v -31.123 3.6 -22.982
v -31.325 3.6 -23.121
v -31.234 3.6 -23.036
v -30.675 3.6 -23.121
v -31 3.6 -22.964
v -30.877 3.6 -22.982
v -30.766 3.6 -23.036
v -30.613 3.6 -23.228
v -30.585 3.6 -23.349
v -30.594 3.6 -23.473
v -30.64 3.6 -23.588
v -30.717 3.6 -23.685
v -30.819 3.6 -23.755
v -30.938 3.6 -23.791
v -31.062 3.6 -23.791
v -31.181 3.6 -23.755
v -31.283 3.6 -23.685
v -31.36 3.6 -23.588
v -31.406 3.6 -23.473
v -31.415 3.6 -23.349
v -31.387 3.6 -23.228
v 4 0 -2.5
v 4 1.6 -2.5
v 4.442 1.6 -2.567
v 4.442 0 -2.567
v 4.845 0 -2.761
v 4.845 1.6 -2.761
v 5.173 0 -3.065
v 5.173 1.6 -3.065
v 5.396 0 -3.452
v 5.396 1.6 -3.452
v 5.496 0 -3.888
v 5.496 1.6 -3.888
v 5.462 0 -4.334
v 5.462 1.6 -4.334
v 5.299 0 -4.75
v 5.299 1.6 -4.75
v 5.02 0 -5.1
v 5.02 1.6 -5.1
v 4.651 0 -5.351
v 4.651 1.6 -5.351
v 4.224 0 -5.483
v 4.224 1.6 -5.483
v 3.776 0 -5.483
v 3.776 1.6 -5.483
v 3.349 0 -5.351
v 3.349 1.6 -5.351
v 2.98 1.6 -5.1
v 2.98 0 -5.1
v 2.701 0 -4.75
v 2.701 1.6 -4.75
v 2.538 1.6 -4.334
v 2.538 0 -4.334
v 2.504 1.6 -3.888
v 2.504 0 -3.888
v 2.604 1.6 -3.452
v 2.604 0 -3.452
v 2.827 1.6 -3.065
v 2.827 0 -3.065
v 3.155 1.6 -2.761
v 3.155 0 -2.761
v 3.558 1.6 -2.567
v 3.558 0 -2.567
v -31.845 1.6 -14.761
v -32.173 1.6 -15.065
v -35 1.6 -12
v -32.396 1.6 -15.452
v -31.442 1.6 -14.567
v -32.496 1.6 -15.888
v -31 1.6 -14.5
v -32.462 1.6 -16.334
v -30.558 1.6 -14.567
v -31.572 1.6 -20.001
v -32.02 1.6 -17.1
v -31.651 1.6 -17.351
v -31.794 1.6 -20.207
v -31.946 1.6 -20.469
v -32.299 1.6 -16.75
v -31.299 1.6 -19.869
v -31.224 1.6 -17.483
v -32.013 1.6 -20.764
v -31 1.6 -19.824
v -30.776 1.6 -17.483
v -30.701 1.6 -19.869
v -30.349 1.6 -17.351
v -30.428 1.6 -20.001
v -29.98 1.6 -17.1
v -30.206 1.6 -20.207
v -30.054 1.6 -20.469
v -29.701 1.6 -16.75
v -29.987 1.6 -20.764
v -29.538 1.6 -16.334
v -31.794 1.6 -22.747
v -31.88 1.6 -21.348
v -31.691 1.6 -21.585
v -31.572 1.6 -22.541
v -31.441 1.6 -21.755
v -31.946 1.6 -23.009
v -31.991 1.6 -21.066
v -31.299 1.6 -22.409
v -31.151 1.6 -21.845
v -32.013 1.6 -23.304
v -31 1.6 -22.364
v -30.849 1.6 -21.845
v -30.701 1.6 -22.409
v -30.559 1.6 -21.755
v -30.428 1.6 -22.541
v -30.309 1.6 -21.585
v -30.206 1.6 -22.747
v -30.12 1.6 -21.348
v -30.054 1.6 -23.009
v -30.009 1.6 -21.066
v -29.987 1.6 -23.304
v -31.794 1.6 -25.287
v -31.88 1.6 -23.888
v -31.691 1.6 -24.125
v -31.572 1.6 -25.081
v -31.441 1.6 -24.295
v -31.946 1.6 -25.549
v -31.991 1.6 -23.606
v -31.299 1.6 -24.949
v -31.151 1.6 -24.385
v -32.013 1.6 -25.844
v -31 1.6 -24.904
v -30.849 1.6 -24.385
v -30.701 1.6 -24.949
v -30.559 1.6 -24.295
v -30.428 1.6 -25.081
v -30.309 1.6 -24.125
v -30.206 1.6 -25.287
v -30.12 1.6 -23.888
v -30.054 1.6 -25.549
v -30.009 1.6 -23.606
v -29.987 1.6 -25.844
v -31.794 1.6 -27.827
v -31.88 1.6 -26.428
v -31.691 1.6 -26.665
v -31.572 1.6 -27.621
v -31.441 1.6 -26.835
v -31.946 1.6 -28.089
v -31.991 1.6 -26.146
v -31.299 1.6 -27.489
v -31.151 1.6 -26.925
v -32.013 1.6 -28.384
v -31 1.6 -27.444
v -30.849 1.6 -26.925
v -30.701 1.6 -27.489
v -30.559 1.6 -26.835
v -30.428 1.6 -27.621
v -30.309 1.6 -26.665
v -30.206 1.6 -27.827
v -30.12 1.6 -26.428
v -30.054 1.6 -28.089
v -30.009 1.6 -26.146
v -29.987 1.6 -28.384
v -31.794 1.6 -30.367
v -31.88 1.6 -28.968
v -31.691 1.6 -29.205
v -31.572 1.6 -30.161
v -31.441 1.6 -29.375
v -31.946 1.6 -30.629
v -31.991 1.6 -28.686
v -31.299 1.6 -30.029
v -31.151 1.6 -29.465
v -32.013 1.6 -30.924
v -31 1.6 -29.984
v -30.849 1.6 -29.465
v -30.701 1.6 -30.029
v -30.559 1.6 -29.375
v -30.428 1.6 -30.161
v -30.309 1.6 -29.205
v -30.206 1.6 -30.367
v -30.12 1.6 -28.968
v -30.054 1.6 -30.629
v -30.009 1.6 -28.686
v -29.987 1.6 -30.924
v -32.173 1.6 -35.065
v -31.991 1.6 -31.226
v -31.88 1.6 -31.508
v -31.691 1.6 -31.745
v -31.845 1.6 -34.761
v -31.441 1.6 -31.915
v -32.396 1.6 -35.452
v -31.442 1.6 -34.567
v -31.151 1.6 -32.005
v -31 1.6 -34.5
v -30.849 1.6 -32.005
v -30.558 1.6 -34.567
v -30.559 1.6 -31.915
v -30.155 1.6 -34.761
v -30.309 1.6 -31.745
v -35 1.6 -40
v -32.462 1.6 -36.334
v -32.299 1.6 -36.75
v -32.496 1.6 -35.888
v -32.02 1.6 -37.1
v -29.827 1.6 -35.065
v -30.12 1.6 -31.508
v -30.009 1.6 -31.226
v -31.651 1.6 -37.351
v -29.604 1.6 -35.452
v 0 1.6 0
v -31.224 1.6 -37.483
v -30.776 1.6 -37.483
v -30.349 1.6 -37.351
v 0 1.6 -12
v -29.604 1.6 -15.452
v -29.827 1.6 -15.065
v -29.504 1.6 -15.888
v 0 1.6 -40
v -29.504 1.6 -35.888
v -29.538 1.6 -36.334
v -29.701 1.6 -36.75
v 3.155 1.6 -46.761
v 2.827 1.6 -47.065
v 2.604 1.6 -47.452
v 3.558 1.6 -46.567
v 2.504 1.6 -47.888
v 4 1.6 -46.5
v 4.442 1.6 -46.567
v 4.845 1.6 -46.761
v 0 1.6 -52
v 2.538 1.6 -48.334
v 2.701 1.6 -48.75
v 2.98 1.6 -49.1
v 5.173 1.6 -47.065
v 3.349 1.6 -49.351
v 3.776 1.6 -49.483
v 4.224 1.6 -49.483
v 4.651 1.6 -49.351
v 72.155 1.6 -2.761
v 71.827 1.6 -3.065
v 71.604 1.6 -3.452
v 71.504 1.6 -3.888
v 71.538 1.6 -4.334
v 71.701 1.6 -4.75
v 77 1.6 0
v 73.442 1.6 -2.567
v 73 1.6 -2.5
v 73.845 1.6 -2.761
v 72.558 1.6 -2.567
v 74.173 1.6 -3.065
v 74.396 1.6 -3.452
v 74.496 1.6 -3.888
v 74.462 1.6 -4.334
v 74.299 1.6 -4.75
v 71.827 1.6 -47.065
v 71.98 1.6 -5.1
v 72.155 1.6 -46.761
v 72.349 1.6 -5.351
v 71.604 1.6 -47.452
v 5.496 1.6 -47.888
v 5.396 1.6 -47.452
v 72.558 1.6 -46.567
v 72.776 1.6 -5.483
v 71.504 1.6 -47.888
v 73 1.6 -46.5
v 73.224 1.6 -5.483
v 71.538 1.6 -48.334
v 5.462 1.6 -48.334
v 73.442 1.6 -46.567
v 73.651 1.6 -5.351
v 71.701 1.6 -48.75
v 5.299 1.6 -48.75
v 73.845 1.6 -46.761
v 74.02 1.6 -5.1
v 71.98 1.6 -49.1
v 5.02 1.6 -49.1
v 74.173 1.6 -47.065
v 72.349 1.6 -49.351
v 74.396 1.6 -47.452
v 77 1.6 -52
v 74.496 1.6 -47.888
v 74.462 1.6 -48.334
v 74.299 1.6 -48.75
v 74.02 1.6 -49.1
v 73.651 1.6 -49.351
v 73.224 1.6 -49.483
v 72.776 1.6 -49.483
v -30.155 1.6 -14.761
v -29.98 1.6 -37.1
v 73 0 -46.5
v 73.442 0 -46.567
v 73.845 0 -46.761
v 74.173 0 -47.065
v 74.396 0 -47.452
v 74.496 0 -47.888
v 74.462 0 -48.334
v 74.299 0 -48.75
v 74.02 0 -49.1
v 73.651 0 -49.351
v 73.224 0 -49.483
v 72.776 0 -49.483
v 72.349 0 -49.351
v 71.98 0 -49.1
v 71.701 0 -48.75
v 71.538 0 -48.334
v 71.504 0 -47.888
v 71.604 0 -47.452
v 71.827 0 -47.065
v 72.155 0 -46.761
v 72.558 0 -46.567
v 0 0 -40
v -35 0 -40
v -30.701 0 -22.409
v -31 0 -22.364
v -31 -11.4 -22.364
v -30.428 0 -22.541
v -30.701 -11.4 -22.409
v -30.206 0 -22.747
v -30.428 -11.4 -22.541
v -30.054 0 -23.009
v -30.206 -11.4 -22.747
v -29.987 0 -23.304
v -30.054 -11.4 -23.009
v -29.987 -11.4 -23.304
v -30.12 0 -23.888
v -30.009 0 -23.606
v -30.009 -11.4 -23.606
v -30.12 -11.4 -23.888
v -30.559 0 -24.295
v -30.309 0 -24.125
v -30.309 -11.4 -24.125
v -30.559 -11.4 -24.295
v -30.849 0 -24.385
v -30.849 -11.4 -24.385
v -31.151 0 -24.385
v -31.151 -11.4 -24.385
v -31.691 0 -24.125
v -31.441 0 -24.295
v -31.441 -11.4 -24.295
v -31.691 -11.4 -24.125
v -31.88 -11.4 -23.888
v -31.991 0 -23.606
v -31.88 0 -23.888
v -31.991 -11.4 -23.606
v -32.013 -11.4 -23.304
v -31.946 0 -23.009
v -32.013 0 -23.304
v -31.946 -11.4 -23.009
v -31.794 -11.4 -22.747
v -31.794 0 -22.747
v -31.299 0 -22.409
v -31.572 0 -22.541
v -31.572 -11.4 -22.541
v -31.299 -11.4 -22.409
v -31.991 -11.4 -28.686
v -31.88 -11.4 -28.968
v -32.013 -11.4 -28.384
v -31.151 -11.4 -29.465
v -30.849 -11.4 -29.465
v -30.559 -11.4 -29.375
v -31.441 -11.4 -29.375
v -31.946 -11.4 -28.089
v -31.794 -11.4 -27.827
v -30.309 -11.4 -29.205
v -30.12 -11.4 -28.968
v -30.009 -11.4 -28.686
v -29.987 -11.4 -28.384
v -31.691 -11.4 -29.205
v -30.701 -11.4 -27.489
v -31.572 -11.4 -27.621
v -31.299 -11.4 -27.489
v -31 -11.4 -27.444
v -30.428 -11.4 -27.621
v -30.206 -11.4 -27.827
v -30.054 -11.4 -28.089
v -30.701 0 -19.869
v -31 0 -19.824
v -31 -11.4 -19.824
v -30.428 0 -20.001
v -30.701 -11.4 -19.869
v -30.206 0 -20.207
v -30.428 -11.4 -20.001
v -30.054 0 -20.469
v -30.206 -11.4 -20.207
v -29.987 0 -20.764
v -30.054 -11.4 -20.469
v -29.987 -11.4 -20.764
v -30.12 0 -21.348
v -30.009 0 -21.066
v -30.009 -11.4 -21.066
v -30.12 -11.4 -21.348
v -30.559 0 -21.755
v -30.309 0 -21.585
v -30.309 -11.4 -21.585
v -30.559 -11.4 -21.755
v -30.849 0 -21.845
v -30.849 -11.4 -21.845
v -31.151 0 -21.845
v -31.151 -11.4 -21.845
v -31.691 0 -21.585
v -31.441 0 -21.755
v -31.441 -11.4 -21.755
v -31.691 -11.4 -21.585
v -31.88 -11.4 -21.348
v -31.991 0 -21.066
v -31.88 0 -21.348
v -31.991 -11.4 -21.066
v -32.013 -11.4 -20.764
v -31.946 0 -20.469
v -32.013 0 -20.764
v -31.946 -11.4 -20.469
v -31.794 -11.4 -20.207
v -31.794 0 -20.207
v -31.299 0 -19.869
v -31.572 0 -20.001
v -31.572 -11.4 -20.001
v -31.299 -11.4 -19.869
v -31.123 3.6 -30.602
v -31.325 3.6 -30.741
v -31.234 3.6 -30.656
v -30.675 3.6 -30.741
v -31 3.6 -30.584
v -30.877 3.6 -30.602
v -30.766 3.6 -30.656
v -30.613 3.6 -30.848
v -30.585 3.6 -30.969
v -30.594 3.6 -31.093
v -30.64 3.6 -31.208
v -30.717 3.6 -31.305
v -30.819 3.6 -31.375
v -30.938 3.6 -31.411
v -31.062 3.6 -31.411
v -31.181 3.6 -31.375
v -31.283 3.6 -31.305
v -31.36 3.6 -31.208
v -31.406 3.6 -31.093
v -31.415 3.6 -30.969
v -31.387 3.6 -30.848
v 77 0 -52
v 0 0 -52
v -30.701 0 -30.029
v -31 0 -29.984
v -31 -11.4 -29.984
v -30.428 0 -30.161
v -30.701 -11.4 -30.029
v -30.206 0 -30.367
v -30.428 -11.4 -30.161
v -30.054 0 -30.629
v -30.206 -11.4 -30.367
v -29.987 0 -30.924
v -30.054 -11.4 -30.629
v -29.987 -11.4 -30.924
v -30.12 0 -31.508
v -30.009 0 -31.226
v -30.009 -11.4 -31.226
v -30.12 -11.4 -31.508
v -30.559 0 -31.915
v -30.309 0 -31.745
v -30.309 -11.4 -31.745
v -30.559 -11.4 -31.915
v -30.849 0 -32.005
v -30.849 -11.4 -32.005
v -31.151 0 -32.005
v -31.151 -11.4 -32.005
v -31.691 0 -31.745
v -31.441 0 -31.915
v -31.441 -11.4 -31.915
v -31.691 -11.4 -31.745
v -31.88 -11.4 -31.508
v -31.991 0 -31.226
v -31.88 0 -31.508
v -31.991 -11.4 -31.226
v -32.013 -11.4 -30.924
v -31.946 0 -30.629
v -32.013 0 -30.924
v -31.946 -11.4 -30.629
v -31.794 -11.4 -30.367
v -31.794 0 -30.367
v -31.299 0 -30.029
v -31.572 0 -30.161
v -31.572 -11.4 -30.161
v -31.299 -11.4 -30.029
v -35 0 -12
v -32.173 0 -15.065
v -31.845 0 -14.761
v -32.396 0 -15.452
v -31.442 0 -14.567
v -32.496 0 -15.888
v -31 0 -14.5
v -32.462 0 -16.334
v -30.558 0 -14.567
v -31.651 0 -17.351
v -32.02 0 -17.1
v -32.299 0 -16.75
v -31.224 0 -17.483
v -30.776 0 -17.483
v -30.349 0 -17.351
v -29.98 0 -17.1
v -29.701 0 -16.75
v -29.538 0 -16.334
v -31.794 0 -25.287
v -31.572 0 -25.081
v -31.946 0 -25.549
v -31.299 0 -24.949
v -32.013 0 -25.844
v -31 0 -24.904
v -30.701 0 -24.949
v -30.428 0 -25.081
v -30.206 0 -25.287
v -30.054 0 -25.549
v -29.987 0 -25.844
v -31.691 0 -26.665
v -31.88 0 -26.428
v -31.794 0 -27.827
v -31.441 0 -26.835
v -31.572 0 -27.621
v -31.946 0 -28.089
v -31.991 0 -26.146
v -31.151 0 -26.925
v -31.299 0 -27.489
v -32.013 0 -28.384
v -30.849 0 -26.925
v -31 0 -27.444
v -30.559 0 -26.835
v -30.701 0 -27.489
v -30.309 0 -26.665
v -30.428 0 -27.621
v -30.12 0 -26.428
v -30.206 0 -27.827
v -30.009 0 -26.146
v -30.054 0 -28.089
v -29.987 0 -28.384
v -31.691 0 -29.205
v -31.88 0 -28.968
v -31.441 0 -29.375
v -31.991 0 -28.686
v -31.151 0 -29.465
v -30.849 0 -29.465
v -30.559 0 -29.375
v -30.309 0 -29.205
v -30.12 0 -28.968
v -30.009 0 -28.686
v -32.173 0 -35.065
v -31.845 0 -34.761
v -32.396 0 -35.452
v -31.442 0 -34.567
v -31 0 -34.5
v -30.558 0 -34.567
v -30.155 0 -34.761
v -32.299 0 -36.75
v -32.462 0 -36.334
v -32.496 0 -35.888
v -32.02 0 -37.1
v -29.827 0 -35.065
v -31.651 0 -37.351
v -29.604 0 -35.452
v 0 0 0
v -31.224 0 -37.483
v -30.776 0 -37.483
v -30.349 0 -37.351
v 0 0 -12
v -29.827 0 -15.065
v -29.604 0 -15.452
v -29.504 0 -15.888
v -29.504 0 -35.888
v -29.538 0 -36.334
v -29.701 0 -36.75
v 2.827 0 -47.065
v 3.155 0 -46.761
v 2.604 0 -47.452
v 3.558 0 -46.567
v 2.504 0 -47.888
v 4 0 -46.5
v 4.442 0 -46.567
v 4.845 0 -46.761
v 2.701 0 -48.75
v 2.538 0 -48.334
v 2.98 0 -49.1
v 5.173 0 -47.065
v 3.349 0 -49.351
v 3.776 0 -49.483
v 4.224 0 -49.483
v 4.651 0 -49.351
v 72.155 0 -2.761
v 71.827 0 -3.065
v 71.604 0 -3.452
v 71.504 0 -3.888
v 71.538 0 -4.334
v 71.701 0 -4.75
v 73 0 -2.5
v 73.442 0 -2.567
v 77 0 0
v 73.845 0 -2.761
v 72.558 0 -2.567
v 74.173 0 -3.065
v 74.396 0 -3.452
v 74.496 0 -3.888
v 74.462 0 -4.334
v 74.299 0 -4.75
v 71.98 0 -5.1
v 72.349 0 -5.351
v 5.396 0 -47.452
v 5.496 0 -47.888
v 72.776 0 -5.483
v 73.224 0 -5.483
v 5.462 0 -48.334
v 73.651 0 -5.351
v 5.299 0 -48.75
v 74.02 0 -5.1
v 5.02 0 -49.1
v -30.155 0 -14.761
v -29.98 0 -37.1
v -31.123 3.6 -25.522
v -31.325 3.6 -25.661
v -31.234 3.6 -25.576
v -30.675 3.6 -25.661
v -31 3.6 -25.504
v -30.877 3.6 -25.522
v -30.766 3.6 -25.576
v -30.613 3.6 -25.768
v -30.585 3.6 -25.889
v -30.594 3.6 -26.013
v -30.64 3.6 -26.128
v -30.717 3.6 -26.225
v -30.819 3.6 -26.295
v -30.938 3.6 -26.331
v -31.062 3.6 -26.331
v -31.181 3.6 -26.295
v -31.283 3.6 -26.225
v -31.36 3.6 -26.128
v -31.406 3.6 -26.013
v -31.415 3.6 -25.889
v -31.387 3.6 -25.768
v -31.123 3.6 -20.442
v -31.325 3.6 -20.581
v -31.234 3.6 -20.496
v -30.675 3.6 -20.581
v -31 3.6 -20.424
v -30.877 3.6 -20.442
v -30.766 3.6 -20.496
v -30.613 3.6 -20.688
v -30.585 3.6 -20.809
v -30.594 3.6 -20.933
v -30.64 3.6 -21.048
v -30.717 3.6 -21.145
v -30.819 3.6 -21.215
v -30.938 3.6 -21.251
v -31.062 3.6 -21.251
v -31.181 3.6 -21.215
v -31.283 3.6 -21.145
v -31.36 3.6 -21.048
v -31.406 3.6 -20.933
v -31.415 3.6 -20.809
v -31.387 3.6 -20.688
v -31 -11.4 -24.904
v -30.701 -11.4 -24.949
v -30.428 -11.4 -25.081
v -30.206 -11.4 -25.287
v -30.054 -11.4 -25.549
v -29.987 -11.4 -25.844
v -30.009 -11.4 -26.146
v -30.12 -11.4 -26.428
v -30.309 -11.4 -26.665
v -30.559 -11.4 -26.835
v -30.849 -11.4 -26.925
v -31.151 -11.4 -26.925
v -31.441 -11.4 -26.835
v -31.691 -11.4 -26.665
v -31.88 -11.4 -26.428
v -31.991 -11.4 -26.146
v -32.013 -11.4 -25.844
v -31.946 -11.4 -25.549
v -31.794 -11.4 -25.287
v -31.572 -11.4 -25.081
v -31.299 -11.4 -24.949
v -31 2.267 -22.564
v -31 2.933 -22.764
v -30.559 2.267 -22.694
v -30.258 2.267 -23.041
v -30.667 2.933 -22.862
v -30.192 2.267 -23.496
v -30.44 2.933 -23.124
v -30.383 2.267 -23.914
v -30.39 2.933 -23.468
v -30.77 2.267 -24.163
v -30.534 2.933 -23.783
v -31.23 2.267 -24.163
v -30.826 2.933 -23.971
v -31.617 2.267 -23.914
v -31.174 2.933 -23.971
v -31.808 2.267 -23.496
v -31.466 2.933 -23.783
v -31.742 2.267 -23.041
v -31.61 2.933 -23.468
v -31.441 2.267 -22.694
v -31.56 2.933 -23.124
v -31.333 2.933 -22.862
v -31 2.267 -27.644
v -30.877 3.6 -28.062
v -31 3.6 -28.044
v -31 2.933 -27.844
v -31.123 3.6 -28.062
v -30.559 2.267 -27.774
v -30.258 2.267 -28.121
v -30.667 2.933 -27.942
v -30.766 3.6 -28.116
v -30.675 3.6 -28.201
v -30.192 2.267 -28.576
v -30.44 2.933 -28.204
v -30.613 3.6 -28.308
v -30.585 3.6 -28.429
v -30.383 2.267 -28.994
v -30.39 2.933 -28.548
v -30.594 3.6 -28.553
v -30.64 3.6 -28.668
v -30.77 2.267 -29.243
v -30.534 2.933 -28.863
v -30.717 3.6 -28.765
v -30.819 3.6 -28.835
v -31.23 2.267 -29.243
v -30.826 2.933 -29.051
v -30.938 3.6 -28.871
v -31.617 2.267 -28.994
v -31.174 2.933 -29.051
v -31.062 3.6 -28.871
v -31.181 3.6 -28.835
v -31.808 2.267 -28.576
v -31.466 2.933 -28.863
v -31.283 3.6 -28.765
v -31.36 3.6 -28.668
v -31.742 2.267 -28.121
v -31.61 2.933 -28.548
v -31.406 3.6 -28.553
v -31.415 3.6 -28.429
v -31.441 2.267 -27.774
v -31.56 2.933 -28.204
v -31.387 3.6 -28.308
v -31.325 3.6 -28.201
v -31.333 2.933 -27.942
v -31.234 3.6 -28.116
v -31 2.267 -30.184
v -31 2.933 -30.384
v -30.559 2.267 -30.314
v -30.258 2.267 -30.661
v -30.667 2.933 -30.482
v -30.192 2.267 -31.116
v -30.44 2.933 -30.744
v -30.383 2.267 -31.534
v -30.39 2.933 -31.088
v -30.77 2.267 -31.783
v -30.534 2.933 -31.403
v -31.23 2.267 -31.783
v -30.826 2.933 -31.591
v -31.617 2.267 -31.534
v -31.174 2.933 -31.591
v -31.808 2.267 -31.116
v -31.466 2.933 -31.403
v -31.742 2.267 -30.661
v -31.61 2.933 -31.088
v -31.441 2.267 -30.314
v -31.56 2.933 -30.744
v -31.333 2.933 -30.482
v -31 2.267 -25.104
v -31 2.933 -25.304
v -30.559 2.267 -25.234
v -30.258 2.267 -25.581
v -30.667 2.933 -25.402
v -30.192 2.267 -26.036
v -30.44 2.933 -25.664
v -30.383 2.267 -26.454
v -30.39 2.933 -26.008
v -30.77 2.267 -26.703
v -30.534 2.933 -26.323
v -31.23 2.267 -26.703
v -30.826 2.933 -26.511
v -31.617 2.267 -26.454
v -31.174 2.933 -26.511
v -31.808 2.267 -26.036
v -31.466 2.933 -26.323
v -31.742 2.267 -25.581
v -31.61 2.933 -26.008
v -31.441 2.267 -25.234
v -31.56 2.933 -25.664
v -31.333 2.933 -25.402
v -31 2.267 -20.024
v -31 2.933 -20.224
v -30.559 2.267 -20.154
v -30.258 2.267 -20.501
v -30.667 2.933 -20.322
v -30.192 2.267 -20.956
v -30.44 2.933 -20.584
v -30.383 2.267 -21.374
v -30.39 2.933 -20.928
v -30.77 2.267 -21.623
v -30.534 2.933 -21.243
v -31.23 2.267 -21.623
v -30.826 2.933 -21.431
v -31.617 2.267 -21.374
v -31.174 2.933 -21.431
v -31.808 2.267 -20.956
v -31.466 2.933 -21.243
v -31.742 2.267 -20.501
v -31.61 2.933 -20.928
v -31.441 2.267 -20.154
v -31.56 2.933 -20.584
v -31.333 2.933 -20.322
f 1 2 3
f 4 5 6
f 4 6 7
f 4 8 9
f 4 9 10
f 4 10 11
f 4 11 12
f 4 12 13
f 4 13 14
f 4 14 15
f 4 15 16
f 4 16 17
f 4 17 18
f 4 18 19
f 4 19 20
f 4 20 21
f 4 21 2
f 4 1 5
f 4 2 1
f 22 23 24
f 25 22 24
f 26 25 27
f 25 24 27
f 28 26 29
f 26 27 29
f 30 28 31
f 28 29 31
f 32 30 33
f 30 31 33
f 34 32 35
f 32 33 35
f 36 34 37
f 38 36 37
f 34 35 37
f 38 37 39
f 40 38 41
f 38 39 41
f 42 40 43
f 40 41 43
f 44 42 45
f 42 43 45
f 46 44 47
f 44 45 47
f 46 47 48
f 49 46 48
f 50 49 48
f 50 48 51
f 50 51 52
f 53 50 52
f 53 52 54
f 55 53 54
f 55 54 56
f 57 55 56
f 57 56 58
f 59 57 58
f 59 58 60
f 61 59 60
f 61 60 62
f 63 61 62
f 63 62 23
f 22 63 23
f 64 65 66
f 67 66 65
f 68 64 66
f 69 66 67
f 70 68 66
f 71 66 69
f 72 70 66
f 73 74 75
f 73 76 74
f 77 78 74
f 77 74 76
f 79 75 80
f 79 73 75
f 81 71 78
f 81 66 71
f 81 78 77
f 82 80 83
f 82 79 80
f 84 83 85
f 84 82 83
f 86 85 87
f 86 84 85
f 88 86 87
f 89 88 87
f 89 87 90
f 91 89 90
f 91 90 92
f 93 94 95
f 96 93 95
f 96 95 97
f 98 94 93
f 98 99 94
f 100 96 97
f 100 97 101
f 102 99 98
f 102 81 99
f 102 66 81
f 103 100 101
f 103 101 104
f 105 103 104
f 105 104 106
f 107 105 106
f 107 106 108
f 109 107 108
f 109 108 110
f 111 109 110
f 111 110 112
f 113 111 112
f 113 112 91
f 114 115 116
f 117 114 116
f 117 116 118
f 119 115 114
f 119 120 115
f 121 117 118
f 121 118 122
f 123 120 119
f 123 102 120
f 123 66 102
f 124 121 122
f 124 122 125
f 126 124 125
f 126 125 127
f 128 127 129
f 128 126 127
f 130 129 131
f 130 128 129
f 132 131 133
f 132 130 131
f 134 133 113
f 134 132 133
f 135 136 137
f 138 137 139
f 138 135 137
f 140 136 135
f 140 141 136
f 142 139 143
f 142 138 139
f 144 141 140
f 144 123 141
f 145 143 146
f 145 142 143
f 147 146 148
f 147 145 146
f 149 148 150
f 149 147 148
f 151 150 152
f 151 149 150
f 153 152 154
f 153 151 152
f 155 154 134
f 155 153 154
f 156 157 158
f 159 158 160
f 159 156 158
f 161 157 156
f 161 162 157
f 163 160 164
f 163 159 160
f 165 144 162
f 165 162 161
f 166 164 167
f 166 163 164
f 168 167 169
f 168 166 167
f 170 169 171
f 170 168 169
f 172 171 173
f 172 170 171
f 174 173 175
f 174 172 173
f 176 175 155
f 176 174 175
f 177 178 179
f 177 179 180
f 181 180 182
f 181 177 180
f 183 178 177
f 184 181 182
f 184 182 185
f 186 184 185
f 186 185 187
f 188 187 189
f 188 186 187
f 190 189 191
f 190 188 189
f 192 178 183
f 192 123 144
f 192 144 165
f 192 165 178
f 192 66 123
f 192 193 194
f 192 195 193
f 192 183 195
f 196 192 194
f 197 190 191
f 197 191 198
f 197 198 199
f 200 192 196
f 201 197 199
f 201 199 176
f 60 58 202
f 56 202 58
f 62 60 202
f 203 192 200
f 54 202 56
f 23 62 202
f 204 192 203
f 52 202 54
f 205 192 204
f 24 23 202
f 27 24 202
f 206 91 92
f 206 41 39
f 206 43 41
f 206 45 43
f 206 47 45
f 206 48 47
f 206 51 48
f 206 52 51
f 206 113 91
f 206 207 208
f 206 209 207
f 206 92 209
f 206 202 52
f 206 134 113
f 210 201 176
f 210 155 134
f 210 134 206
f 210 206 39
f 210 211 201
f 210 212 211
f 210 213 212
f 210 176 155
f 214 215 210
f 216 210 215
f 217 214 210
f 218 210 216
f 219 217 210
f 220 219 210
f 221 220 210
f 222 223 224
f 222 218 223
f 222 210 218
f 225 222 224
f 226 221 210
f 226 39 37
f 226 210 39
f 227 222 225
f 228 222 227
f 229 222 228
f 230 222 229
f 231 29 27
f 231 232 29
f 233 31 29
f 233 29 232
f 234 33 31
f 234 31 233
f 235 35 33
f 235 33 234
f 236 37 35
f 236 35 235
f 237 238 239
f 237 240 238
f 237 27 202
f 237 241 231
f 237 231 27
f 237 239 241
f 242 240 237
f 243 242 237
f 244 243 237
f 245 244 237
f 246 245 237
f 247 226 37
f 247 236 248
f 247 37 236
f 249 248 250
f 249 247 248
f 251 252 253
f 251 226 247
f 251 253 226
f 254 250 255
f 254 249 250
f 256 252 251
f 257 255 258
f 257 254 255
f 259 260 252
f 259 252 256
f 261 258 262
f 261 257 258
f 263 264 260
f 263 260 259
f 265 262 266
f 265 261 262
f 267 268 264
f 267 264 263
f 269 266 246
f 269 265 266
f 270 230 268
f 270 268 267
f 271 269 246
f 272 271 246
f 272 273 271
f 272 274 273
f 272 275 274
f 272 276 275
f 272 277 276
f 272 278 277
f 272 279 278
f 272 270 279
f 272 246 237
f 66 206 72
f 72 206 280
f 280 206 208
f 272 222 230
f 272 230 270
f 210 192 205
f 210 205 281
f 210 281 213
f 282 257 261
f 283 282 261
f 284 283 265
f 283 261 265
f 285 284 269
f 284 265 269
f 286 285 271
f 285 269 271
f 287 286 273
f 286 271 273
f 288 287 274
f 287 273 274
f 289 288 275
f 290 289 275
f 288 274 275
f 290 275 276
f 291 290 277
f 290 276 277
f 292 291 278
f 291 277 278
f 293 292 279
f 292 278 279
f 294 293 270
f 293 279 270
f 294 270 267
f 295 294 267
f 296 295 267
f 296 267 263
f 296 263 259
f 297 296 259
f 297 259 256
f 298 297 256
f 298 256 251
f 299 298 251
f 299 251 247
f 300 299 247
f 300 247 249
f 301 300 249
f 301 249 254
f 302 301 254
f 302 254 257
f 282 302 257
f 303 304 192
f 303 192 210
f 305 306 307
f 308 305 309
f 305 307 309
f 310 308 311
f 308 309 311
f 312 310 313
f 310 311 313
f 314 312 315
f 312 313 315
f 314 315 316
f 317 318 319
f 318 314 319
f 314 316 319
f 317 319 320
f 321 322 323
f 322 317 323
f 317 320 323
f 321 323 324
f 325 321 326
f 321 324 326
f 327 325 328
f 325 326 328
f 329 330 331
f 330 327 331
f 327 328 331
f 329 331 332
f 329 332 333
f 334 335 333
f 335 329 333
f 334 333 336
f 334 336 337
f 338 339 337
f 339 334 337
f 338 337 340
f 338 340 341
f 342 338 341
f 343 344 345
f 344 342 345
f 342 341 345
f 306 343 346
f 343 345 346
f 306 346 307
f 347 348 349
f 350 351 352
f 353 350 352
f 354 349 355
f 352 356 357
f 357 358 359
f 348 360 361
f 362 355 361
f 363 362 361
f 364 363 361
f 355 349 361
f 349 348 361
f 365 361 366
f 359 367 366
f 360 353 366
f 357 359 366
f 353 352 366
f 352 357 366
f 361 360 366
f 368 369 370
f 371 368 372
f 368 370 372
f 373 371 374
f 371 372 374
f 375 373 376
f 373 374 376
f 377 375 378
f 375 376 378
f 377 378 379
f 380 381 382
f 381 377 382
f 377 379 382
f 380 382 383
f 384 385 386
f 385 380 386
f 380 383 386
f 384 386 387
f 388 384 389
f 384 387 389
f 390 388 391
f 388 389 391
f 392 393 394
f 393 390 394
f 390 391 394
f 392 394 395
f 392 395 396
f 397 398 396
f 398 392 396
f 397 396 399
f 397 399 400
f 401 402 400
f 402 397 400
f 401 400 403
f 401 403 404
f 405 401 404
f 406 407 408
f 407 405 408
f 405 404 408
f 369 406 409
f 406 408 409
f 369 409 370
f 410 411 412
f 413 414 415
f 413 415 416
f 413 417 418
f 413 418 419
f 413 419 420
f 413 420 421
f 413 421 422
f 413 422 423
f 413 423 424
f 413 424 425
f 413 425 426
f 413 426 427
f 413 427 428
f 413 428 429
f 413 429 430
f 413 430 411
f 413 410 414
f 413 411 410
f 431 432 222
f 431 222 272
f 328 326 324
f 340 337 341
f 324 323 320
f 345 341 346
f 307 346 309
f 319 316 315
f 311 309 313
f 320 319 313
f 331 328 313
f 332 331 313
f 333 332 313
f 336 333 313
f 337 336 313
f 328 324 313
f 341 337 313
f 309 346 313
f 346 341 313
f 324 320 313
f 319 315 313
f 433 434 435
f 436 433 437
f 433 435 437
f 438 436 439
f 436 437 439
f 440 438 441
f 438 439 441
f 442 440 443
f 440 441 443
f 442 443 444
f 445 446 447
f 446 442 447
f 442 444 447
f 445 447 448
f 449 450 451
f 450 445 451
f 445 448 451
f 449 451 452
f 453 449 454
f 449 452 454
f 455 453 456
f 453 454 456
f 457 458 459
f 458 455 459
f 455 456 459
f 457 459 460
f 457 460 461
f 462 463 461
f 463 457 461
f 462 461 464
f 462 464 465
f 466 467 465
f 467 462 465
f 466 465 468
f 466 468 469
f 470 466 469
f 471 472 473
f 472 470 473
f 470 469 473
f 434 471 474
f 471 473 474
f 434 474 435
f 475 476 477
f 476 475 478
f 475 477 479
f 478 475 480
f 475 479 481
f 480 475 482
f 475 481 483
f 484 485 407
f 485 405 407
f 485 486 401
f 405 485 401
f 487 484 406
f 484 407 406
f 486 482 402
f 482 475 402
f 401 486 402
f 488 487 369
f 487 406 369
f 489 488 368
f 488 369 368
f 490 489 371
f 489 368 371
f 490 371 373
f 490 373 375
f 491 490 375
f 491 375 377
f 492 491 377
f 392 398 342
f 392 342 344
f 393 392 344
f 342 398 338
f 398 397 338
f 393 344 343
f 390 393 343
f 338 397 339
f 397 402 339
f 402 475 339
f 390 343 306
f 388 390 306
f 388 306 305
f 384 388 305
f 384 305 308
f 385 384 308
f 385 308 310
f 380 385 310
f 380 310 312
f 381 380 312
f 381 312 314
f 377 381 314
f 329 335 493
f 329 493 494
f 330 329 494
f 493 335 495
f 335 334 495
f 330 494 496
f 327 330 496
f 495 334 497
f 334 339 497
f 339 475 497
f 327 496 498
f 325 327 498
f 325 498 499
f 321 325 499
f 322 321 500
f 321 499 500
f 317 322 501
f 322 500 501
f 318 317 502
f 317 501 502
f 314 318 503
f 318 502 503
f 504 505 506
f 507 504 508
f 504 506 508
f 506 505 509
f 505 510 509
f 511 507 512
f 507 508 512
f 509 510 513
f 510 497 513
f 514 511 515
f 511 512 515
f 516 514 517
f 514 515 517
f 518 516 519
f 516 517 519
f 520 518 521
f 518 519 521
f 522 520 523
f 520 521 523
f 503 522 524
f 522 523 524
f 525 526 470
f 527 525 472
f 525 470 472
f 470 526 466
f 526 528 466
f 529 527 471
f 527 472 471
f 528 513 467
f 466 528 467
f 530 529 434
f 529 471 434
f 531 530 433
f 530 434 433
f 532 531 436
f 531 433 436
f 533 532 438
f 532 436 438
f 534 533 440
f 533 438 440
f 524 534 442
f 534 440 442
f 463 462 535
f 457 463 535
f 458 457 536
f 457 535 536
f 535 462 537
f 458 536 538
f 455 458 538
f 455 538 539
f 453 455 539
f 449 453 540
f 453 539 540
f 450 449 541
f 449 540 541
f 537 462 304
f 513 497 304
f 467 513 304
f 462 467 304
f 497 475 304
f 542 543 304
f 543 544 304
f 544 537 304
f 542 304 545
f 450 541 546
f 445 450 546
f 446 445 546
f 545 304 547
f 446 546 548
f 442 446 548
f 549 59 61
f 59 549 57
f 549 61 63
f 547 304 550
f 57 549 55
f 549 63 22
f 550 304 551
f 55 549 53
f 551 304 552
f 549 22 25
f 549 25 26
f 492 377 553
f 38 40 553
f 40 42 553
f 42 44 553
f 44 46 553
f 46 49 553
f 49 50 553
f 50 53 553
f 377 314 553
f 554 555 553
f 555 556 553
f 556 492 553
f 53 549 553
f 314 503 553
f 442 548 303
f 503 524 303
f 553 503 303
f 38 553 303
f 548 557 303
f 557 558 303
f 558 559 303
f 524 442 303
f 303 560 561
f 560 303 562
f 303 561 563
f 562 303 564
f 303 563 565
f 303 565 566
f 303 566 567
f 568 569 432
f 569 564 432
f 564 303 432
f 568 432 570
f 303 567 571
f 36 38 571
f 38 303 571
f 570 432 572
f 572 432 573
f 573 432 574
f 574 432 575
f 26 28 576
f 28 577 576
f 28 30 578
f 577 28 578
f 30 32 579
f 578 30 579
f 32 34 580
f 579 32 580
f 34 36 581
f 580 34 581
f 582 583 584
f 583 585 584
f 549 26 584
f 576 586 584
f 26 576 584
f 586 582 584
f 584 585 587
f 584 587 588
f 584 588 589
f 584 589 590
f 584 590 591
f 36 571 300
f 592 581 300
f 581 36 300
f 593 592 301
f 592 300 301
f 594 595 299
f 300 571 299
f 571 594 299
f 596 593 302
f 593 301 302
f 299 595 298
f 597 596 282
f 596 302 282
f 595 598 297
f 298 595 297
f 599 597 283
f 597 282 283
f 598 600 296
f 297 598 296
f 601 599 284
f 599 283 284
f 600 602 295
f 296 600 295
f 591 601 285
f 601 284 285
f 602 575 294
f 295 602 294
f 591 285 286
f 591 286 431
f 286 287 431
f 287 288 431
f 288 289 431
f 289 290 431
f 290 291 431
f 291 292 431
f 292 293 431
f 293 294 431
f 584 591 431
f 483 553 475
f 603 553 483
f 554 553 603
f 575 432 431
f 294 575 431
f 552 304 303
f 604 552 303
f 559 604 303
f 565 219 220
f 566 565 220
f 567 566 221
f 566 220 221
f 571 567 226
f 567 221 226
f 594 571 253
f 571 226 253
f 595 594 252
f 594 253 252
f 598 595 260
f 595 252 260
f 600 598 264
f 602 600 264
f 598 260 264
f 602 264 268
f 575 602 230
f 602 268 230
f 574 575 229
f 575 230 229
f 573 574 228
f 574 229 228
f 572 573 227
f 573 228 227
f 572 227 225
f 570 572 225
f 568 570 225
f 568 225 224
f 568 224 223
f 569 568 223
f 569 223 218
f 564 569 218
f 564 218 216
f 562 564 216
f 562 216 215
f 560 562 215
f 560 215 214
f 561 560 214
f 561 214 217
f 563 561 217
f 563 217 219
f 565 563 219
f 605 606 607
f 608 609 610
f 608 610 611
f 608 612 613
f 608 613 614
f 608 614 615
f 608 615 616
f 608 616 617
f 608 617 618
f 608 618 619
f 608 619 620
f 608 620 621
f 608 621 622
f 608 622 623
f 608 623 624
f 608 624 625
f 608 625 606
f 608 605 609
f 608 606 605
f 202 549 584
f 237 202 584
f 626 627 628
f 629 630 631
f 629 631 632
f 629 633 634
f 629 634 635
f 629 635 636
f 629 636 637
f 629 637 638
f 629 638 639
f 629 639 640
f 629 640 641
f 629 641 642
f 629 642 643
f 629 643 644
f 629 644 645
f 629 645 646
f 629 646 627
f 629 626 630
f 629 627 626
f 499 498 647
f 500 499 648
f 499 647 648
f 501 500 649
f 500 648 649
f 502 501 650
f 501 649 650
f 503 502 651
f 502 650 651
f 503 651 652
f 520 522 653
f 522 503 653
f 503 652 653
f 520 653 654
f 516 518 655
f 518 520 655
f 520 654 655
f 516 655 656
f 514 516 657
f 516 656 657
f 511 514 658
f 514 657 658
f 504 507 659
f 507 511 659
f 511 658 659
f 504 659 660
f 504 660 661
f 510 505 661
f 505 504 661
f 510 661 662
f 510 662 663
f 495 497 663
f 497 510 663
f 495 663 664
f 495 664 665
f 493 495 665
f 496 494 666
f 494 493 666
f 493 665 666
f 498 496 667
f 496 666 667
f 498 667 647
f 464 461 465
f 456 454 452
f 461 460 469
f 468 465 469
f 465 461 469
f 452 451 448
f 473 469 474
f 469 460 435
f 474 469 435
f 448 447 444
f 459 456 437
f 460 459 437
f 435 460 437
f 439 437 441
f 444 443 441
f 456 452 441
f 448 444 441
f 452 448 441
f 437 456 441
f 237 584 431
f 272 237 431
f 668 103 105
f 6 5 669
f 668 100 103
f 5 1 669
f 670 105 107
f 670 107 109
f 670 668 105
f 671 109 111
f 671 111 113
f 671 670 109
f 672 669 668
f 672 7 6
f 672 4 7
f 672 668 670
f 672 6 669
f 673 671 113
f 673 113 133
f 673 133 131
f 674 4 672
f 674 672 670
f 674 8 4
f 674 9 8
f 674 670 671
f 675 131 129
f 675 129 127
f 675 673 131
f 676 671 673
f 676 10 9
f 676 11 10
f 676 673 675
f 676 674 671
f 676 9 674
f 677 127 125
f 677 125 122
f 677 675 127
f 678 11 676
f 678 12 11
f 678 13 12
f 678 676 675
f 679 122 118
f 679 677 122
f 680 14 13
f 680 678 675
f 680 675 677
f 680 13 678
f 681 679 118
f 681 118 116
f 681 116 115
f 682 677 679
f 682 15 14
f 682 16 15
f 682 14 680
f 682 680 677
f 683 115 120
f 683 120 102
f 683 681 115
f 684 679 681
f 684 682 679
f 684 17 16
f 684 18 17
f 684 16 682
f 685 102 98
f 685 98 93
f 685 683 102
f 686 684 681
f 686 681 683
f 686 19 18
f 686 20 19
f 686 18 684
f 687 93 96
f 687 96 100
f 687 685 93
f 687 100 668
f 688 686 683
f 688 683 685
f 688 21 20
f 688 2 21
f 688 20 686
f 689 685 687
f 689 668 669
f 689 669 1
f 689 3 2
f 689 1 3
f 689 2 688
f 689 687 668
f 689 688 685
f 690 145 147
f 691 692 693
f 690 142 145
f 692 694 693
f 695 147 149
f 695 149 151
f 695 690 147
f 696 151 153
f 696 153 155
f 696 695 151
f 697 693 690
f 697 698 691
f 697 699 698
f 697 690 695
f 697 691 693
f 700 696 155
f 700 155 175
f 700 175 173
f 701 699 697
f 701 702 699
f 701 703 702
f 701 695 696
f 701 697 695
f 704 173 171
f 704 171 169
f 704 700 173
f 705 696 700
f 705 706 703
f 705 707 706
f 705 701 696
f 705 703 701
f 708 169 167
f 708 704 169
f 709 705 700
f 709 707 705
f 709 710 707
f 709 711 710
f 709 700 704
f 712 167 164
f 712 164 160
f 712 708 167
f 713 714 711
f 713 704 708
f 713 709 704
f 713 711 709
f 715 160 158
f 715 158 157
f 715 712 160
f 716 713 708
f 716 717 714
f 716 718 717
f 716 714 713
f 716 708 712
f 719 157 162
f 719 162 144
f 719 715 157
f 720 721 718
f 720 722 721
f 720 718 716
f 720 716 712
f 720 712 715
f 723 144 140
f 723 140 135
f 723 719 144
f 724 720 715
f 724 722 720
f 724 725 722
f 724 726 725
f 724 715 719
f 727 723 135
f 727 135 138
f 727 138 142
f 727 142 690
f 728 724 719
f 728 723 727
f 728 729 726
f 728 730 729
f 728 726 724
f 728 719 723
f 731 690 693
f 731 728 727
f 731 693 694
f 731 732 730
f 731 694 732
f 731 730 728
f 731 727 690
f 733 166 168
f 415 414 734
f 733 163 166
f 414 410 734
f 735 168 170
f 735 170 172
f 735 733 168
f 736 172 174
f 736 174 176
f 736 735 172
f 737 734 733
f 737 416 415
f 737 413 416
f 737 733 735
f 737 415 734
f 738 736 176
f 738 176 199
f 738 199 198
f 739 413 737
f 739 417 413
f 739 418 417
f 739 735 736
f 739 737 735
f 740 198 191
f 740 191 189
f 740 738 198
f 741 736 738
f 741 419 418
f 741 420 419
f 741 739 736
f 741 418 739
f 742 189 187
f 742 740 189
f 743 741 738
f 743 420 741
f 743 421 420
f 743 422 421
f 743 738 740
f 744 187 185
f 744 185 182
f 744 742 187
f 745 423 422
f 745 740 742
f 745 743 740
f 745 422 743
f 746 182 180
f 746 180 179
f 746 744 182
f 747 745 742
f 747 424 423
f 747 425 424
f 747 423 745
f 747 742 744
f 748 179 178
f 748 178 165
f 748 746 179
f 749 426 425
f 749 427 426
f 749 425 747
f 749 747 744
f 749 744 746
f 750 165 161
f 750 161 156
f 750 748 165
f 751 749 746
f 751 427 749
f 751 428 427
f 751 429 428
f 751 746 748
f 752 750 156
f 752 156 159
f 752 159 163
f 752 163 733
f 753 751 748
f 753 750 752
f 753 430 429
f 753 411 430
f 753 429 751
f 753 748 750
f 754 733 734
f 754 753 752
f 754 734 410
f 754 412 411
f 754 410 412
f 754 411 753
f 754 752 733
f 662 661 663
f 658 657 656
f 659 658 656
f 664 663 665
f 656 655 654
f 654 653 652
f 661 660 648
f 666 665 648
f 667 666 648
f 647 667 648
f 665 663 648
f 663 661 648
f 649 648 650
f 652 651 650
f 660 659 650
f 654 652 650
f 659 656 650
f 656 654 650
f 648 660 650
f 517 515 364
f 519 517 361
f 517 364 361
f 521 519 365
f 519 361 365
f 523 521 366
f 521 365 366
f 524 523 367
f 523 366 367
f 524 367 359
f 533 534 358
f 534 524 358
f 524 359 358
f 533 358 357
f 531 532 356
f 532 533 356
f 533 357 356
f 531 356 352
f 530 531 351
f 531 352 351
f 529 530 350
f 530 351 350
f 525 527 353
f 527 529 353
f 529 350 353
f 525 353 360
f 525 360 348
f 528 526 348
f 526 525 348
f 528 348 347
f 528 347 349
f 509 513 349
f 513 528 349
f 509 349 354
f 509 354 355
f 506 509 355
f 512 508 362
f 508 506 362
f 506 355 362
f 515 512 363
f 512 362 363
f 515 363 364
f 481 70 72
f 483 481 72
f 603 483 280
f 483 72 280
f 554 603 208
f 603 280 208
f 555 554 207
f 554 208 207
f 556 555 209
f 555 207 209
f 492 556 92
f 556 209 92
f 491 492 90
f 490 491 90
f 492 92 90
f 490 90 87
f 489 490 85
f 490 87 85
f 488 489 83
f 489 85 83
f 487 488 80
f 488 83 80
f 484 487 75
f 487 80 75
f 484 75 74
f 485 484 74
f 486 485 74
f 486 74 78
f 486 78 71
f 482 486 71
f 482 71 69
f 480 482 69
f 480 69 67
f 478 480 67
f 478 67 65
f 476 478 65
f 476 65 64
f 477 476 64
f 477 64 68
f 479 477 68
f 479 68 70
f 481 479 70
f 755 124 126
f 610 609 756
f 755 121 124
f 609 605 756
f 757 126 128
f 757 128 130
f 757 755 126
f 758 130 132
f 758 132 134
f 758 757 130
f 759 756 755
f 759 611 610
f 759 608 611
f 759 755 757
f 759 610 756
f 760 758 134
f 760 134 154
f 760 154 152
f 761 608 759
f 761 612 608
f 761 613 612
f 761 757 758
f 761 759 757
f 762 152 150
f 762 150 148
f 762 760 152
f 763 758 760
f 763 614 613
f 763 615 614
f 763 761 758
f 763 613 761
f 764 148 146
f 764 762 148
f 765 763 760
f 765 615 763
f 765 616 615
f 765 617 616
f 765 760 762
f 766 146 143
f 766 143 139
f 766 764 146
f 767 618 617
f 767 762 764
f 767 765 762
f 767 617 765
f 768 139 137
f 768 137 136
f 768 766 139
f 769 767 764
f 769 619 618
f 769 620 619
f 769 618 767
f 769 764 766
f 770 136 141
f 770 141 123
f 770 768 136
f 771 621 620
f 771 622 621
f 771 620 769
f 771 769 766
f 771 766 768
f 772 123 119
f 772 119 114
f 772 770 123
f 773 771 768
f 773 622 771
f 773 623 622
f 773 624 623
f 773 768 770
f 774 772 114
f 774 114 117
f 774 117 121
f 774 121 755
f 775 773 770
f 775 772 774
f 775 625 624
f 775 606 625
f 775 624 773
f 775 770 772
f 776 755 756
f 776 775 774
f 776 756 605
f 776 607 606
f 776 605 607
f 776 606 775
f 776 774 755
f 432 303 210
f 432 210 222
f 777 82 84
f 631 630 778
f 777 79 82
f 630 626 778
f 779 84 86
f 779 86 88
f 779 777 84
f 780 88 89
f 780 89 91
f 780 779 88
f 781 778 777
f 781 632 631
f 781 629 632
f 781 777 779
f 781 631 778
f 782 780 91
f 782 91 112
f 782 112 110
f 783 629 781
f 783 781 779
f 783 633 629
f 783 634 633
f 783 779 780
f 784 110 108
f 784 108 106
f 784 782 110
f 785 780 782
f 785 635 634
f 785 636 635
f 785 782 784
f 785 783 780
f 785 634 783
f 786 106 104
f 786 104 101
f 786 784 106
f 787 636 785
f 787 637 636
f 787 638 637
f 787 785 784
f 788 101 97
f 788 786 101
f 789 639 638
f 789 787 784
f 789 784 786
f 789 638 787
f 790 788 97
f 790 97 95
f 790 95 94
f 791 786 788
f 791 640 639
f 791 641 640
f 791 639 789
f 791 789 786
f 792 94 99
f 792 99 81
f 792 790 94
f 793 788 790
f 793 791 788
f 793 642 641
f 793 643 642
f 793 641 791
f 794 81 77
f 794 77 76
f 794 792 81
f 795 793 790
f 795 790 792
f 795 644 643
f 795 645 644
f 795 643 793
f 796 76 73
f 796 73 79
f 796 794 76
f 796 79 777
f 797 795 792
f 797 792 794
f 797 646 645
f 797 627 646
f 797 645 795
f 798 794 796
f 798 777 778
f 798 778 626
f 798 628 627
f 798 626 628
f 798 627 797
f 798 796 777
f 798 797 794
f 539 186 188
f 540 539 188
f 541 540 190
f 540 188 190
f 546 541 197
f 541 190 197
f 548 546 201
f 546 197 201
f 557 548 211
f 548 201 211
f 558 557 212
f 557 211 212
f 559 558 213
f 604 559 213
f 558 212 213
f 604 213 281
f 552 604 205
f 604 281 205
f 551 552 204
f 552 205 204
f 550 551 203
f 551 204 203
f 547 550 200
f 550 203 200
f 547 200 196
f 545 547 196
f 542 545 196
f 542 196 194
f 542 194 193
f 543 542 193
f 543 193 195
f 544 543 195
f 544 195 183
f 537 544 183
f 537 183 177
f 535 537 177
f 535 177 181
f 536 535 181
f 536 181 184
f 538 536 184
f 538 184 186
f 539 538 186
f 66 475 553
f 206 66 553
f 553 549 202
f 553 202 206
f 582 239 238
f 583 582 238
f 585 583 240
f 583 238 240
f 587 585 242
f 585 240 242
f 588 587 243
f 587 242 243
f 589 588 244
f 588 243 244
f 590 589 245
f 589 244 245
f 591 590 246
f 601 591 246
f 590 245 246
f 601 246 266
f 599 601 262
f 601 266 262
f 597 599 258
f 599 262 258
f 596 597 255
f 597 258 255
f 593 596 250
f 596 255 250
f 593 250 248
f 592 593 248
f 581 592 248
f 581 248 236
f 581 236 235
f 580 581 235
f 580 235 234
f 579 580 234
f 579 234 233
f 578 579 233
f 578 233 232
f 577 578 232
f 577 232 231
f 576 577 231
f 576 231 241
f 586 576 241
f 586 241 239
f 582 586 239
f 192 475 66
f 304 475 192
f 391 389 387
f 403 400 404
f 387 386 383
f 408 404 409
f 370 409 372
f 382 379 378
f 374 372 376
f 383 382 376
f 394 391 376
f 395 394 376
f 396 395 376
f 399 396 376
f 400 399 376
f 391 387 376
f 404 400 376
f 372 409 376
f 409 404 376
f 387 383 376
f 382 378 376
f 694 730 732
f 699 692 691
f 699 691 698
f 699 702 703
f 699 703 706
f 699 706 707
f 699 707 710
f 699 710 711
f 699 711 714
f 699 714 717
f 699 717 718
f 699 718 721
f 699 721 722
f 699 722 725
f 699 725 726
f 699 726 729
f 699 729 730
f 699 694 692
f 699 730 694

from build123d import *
from OCP.BRepFilletAPI import BRepFilletAPI_MakeChamfer

# Parameters (mm, degrees)
ESQUISSE1_W             = 35
ESQUISSE1_H             = 28
ESQUISSE1_W_2           = 77
ESQUISSE1_H_2           = 52
BOSS_EXTRU_1_DEPTH      = 1.6
ENL_V_MAT_EXTRU_1_REACH = 94.928
ESQUISSE2_R             = 1.5
BOSS_EXTRU_2_DEPTH      = 2
BOSS_EXTRU_2_DEPTH_BACK = 13
ESQUISSE3_R             = 1.016
CHANFREIN1_SIZE         = 2
CHANFREIN1_SIZE_2       = 0.6


with BuildPart() as part:
    # Esquisse1 → Boss.-Extru.1 (new body)
    with BuildSketch(Plane(origin=(0, 0, 0), x_dir=(1, 0, 0), z_dir=(0, 1, 0))):
        with Locations((-17.5, 26)):
            Rectangle(ESQUISSE1_W, ESQUISSE1_H)
        with Locations((38.5, 26)):
            Rectangle(ESQUISSE1_W_2, ESQUISSE1_H_2)
    extrude(amount=BOSS_EXTRU_1_DEPTH)

    # Esquisse2 → Enlèv. mat.-Extru.1 (cut, up to next)
    with BuildSketch(Plane(origin=(0, 1.6, 0), x_dir=(1, 0, 0), z_dir=(0, 1, 0)), mode=Mode.PRIVATE) as enl_v_mat_extru_1_sk1:
        with Locations(Location((-31, 36, 0), (0, 0, 270))):
            Circle(ESQUISSE2_R)
    enl_v_mat_extru_1_tool1 = extrude(enl_v_mat_extru_1_sk1.sketch, amount=-ENL_V_MAT_EXTRU_1_REACH, mode=Mode.PRIVATE) & part.part
    # Esquisse2 → Enlèv. mat.-Extru.1 (cut, up to next)
    with BuildSketch(Plane(origin=(0, 1.6, 0), x_dir=(1, 0, 0), z_dir=(0, 1, 0)), mode=Mode.PRIVATE) as enl_v_mat_extru_1_sk2:
        with Locations(Location((-31, 16, 0), (0, 0, 270))):
            Circle(ESQUISSE2_R)
    enl_v_mat_extru_1_tool2 = extrude(enl_v_mat_extru_1_sk2.sketch, amount=-ENL_V_MAT_EXTRU_1_REACH, mode=Mode.PRIVATE) & part.part
    # Esquisse2 → Enlèv. mat.-Extru.1 (cut, up to next)
    with BuildSketch(Plane(origin=(0, 1.6, 0), x_dir=(1, 0, 0), z_dir=(0, 1, 0)), mode=Mode.PRIVATE) as enl_v_mat_extru_1_sk3:
        with Locations(Location((4, 4, 0), (0, 0, 270))):
            Circle(ESQUISSE2_R)
    enl_v_mat_extru_1_tool3 = extrude(enl_v_mat_extru_1_sk3.sketch, amount=-ENL_V_MAT_EXTRU_1_REACH, mode=Mode.PRIVATE) & part.part
    # Esquisse2 → Enlèv. mat.-Extru.1 (cut, up to next)
    with BuildSketch(Plane(origin=(0, 1.6, 0), x_dir=(1, 0, 0), z_dir=(0, 1, 0)), mode=Mode.PRIVATE) as enl_v_mat_extru_1_sk4:
        with Locations(Location((4, 48, 0), (0, 0, 270))):
            Circle(ESQUISSE2_R)
    enl_v_mat_extru_1_tool4 = extrude(enl_v_mat_extru_1_sk4.sketch, amount=-ENL_V_MAT_EXTRU_1_REACH, mode=Mode.PRIVATE) & part.part
    # Esquisse2 → Enlèv. mat.-Extru.1 (cut, up to next)
    with BuildSketch(Plane(origin=(0, 1.6, 0), x_dir=(1, 0, 0), z_dir=(0, 1, 0)), mode=Mode.PRIVATE) as enl_v_mat_extru_1_sk5:
        with Locations(Location((73, 48, 0), (0, 0, 270))):
            Circle(ESQUISSE2_R)
    enl_v_mat_extru_1_tool5 = extrude(enl_v_mat_extru_1_sk5.sketch, amount=-ENL_V_MAT_EXTRU_1_REACH, mode=Mode.PRIVATE) & part.part
    # Esquisse2 → Enlèv. mat.-Extru.1 (cut, up to next)
    with BuildSketch(Plane(origin=(0, 1.6, 0), x_dir=(1, 0, 0), z_dir=(0, 1, 0)), mode=Mode.PRIVATE) as enl_v_mat_extru_1_sk6:
        with Locations(Location((73, 4, 0), (0, 0, 270))):
            Circle(ESQUISSE2_R)
    enl_v_mat_extru_1_tool6 = extrude(enl_v_mat_extru_1_sk6.sketch, amount=-ENL_V_MAT_EXTRU_1_REACH, mode=Mode.PRIVATE) & part.part
    add(enl_v_mat_extru_1_tool1.solids().sort_by_distance((-31, 1.6, -36))[0], mode=Mode.SUBTRACT)
    add(enl_v_mat_extru_1_tool2.solids().sort_by_distance((-31, 1.6, -16))[0], mode=Mode.SUBTRACT)
    add(enl_v_mat_extru_1_tool3.solids().sort_by_distance((4, 1.6, -4))[0], mode=Mode.SUBTRACT)
    add(enl_v_mat_extru_1_tool4.solids().sort_by_distance((4, 1.6, -48))[0], mode=Mode.SUBTRACT)
    add(enl_v_mat_extru_1_tool5.solids().sort_by_distance((73, 1.6, -48))[0], mode=Mode.SUBTRACT)
    add(enl_v_mat_extru_1_tool6.solids().sort_by_distance((73, 1.6, -4))[0], mode=Mode.SUBTRACT)

    # Esquisse3 → Boss.-Extru.2 (add, two sides: drawn at the far end of the back side and taken through both)
    with BuildSketch(Plane(origin=(0, 1.6, 0), x_dir=(1, 0, 0), z_dir=(0, 1, 0)).offset(-BOSS_EXTRU_2_DEPTH_BACK)):
        with Locations(Location((-31, 31, 0), (0, 0, 270))):
            Circle(ESQUISSE3_R)
        with Locations(Location((-31, 28.46, 0), (0, 0, 270))):
            Circle(ESQUISSE3_R)
        with Locations(Location((-31, 25.92, 0), (0, 0, 270))):
            Circle(ESQUISSE3_R)
        with Locations(Location((-31, 23.38, 0), (0, 0, 270))):
            Circle(ESQUISSE3_R)
        with Locations(Location((-31, 20.84, 0), (0, 0, 270))):
            Circle(ESQUISSE3_R)
    extrude(amount=BOSS_EXTRU_2_DEPTH + BOSS_EXTRU_2_DEPTH_BACK)

    # Chanfrein1
    chanfrein1_edges_1 = [part.edges().sort_by_distance(p)[0] for p in [
        (-31, 3.6, -32.016),
    ]]
    chanfrein1_side_1 = [part.faces().sort_by_distance(p)[0] for p in [
        (-31, 3.588, -32.016),
    ]]
    chanfrein1_edges_2 = [part.edges().sort_by_distance(p)[0] for p in [
        (-31, 3.6, -29.476),
    ]]
    chanfrein1_side_2 = [part.faces().sort_by_distance(p)[0] for p in [
        (-31, 3.588, -29.476),
    ]]
    chanfrein1_edges_3 = [part.edges().sort_by_distance(p)[0] for p in [
        (-31, 3.6, -26.936),
    ]]
    chanfrein1_side_3 = [part.faces().sort_by_distance(p)[0] for p in [
        (-31, 3.588, -26.936),
    ]]
    chanfrein1_edges_4 = [part.edges().sort_by_distance(p)[0] for p in [
        (-31, 3.6, -24.396),
    ]]
    chanfrein1_side_4 = [part.faces().sort_by_distance(p)[0] for p in [
        (-31, 3.588, -24.396),
    ]]
    chanfrein1_edges_5 = [part.edges().sort_by_distance(p)[0] for p in [
        (-31, 3.6, -21.856),
    ]]
    chanfrein1_side_5 = [part.faces().sort_by_distance(p)[0] for p in [
        (-31, 3.588, -21.856),
    ]]
    chanfrein1 = BRepFilletAPI_MakeChamfer(part.part.solid().wrapped)
    for e in chanfrein1_edges_1:
        chanfrein1.Add(CHANFREIN1_SIZE - 0.0001, CHANFREIN1_SIZE_2 - 0.0001, e.wrapped, chanfrein1_side_1[0].wrapped)
    for e in chanfrein1_edges_2:
        chanfrein1.Add(CHANFREIN1_SIZE - 0.0001, CHANFREIN1_SIZE_2 - 0.0001, e.wrapped, chanfrein1_side_2[0].wrapped)
    for e in chanfrein1_edges_3:
        chanfrein1.Add(CHANFREIN1_SIZE - 0.0001, CHANFREIN1_SIZE_2 - 0.0001, e.wrapped, chanfrein1_side_3[0].wrapped)
    for e in chanfrein1_edges_4:
        chanfrein1.Add(CHANFREIN1_SIZE - 0.0001, CHANFREIN1_SIZE_2 - 0.0001, e.wrapped, chanfrein1_side_4[0].wrapped)
    for e in chanfrein1_edges_5:
        chanfrein1.Add(CHANFREIN1_SIZE - 0.0001, CHANFREIN1_SIZE_2 - 0.0001, e.wrapped, chanfrein1_side_5[0].wrapped)
    add(Compound.cast(chanfrein1.Shape()), mode=Mode.REPLACE)  # a hair under: the kernel refuses the full size


solid = part.part
